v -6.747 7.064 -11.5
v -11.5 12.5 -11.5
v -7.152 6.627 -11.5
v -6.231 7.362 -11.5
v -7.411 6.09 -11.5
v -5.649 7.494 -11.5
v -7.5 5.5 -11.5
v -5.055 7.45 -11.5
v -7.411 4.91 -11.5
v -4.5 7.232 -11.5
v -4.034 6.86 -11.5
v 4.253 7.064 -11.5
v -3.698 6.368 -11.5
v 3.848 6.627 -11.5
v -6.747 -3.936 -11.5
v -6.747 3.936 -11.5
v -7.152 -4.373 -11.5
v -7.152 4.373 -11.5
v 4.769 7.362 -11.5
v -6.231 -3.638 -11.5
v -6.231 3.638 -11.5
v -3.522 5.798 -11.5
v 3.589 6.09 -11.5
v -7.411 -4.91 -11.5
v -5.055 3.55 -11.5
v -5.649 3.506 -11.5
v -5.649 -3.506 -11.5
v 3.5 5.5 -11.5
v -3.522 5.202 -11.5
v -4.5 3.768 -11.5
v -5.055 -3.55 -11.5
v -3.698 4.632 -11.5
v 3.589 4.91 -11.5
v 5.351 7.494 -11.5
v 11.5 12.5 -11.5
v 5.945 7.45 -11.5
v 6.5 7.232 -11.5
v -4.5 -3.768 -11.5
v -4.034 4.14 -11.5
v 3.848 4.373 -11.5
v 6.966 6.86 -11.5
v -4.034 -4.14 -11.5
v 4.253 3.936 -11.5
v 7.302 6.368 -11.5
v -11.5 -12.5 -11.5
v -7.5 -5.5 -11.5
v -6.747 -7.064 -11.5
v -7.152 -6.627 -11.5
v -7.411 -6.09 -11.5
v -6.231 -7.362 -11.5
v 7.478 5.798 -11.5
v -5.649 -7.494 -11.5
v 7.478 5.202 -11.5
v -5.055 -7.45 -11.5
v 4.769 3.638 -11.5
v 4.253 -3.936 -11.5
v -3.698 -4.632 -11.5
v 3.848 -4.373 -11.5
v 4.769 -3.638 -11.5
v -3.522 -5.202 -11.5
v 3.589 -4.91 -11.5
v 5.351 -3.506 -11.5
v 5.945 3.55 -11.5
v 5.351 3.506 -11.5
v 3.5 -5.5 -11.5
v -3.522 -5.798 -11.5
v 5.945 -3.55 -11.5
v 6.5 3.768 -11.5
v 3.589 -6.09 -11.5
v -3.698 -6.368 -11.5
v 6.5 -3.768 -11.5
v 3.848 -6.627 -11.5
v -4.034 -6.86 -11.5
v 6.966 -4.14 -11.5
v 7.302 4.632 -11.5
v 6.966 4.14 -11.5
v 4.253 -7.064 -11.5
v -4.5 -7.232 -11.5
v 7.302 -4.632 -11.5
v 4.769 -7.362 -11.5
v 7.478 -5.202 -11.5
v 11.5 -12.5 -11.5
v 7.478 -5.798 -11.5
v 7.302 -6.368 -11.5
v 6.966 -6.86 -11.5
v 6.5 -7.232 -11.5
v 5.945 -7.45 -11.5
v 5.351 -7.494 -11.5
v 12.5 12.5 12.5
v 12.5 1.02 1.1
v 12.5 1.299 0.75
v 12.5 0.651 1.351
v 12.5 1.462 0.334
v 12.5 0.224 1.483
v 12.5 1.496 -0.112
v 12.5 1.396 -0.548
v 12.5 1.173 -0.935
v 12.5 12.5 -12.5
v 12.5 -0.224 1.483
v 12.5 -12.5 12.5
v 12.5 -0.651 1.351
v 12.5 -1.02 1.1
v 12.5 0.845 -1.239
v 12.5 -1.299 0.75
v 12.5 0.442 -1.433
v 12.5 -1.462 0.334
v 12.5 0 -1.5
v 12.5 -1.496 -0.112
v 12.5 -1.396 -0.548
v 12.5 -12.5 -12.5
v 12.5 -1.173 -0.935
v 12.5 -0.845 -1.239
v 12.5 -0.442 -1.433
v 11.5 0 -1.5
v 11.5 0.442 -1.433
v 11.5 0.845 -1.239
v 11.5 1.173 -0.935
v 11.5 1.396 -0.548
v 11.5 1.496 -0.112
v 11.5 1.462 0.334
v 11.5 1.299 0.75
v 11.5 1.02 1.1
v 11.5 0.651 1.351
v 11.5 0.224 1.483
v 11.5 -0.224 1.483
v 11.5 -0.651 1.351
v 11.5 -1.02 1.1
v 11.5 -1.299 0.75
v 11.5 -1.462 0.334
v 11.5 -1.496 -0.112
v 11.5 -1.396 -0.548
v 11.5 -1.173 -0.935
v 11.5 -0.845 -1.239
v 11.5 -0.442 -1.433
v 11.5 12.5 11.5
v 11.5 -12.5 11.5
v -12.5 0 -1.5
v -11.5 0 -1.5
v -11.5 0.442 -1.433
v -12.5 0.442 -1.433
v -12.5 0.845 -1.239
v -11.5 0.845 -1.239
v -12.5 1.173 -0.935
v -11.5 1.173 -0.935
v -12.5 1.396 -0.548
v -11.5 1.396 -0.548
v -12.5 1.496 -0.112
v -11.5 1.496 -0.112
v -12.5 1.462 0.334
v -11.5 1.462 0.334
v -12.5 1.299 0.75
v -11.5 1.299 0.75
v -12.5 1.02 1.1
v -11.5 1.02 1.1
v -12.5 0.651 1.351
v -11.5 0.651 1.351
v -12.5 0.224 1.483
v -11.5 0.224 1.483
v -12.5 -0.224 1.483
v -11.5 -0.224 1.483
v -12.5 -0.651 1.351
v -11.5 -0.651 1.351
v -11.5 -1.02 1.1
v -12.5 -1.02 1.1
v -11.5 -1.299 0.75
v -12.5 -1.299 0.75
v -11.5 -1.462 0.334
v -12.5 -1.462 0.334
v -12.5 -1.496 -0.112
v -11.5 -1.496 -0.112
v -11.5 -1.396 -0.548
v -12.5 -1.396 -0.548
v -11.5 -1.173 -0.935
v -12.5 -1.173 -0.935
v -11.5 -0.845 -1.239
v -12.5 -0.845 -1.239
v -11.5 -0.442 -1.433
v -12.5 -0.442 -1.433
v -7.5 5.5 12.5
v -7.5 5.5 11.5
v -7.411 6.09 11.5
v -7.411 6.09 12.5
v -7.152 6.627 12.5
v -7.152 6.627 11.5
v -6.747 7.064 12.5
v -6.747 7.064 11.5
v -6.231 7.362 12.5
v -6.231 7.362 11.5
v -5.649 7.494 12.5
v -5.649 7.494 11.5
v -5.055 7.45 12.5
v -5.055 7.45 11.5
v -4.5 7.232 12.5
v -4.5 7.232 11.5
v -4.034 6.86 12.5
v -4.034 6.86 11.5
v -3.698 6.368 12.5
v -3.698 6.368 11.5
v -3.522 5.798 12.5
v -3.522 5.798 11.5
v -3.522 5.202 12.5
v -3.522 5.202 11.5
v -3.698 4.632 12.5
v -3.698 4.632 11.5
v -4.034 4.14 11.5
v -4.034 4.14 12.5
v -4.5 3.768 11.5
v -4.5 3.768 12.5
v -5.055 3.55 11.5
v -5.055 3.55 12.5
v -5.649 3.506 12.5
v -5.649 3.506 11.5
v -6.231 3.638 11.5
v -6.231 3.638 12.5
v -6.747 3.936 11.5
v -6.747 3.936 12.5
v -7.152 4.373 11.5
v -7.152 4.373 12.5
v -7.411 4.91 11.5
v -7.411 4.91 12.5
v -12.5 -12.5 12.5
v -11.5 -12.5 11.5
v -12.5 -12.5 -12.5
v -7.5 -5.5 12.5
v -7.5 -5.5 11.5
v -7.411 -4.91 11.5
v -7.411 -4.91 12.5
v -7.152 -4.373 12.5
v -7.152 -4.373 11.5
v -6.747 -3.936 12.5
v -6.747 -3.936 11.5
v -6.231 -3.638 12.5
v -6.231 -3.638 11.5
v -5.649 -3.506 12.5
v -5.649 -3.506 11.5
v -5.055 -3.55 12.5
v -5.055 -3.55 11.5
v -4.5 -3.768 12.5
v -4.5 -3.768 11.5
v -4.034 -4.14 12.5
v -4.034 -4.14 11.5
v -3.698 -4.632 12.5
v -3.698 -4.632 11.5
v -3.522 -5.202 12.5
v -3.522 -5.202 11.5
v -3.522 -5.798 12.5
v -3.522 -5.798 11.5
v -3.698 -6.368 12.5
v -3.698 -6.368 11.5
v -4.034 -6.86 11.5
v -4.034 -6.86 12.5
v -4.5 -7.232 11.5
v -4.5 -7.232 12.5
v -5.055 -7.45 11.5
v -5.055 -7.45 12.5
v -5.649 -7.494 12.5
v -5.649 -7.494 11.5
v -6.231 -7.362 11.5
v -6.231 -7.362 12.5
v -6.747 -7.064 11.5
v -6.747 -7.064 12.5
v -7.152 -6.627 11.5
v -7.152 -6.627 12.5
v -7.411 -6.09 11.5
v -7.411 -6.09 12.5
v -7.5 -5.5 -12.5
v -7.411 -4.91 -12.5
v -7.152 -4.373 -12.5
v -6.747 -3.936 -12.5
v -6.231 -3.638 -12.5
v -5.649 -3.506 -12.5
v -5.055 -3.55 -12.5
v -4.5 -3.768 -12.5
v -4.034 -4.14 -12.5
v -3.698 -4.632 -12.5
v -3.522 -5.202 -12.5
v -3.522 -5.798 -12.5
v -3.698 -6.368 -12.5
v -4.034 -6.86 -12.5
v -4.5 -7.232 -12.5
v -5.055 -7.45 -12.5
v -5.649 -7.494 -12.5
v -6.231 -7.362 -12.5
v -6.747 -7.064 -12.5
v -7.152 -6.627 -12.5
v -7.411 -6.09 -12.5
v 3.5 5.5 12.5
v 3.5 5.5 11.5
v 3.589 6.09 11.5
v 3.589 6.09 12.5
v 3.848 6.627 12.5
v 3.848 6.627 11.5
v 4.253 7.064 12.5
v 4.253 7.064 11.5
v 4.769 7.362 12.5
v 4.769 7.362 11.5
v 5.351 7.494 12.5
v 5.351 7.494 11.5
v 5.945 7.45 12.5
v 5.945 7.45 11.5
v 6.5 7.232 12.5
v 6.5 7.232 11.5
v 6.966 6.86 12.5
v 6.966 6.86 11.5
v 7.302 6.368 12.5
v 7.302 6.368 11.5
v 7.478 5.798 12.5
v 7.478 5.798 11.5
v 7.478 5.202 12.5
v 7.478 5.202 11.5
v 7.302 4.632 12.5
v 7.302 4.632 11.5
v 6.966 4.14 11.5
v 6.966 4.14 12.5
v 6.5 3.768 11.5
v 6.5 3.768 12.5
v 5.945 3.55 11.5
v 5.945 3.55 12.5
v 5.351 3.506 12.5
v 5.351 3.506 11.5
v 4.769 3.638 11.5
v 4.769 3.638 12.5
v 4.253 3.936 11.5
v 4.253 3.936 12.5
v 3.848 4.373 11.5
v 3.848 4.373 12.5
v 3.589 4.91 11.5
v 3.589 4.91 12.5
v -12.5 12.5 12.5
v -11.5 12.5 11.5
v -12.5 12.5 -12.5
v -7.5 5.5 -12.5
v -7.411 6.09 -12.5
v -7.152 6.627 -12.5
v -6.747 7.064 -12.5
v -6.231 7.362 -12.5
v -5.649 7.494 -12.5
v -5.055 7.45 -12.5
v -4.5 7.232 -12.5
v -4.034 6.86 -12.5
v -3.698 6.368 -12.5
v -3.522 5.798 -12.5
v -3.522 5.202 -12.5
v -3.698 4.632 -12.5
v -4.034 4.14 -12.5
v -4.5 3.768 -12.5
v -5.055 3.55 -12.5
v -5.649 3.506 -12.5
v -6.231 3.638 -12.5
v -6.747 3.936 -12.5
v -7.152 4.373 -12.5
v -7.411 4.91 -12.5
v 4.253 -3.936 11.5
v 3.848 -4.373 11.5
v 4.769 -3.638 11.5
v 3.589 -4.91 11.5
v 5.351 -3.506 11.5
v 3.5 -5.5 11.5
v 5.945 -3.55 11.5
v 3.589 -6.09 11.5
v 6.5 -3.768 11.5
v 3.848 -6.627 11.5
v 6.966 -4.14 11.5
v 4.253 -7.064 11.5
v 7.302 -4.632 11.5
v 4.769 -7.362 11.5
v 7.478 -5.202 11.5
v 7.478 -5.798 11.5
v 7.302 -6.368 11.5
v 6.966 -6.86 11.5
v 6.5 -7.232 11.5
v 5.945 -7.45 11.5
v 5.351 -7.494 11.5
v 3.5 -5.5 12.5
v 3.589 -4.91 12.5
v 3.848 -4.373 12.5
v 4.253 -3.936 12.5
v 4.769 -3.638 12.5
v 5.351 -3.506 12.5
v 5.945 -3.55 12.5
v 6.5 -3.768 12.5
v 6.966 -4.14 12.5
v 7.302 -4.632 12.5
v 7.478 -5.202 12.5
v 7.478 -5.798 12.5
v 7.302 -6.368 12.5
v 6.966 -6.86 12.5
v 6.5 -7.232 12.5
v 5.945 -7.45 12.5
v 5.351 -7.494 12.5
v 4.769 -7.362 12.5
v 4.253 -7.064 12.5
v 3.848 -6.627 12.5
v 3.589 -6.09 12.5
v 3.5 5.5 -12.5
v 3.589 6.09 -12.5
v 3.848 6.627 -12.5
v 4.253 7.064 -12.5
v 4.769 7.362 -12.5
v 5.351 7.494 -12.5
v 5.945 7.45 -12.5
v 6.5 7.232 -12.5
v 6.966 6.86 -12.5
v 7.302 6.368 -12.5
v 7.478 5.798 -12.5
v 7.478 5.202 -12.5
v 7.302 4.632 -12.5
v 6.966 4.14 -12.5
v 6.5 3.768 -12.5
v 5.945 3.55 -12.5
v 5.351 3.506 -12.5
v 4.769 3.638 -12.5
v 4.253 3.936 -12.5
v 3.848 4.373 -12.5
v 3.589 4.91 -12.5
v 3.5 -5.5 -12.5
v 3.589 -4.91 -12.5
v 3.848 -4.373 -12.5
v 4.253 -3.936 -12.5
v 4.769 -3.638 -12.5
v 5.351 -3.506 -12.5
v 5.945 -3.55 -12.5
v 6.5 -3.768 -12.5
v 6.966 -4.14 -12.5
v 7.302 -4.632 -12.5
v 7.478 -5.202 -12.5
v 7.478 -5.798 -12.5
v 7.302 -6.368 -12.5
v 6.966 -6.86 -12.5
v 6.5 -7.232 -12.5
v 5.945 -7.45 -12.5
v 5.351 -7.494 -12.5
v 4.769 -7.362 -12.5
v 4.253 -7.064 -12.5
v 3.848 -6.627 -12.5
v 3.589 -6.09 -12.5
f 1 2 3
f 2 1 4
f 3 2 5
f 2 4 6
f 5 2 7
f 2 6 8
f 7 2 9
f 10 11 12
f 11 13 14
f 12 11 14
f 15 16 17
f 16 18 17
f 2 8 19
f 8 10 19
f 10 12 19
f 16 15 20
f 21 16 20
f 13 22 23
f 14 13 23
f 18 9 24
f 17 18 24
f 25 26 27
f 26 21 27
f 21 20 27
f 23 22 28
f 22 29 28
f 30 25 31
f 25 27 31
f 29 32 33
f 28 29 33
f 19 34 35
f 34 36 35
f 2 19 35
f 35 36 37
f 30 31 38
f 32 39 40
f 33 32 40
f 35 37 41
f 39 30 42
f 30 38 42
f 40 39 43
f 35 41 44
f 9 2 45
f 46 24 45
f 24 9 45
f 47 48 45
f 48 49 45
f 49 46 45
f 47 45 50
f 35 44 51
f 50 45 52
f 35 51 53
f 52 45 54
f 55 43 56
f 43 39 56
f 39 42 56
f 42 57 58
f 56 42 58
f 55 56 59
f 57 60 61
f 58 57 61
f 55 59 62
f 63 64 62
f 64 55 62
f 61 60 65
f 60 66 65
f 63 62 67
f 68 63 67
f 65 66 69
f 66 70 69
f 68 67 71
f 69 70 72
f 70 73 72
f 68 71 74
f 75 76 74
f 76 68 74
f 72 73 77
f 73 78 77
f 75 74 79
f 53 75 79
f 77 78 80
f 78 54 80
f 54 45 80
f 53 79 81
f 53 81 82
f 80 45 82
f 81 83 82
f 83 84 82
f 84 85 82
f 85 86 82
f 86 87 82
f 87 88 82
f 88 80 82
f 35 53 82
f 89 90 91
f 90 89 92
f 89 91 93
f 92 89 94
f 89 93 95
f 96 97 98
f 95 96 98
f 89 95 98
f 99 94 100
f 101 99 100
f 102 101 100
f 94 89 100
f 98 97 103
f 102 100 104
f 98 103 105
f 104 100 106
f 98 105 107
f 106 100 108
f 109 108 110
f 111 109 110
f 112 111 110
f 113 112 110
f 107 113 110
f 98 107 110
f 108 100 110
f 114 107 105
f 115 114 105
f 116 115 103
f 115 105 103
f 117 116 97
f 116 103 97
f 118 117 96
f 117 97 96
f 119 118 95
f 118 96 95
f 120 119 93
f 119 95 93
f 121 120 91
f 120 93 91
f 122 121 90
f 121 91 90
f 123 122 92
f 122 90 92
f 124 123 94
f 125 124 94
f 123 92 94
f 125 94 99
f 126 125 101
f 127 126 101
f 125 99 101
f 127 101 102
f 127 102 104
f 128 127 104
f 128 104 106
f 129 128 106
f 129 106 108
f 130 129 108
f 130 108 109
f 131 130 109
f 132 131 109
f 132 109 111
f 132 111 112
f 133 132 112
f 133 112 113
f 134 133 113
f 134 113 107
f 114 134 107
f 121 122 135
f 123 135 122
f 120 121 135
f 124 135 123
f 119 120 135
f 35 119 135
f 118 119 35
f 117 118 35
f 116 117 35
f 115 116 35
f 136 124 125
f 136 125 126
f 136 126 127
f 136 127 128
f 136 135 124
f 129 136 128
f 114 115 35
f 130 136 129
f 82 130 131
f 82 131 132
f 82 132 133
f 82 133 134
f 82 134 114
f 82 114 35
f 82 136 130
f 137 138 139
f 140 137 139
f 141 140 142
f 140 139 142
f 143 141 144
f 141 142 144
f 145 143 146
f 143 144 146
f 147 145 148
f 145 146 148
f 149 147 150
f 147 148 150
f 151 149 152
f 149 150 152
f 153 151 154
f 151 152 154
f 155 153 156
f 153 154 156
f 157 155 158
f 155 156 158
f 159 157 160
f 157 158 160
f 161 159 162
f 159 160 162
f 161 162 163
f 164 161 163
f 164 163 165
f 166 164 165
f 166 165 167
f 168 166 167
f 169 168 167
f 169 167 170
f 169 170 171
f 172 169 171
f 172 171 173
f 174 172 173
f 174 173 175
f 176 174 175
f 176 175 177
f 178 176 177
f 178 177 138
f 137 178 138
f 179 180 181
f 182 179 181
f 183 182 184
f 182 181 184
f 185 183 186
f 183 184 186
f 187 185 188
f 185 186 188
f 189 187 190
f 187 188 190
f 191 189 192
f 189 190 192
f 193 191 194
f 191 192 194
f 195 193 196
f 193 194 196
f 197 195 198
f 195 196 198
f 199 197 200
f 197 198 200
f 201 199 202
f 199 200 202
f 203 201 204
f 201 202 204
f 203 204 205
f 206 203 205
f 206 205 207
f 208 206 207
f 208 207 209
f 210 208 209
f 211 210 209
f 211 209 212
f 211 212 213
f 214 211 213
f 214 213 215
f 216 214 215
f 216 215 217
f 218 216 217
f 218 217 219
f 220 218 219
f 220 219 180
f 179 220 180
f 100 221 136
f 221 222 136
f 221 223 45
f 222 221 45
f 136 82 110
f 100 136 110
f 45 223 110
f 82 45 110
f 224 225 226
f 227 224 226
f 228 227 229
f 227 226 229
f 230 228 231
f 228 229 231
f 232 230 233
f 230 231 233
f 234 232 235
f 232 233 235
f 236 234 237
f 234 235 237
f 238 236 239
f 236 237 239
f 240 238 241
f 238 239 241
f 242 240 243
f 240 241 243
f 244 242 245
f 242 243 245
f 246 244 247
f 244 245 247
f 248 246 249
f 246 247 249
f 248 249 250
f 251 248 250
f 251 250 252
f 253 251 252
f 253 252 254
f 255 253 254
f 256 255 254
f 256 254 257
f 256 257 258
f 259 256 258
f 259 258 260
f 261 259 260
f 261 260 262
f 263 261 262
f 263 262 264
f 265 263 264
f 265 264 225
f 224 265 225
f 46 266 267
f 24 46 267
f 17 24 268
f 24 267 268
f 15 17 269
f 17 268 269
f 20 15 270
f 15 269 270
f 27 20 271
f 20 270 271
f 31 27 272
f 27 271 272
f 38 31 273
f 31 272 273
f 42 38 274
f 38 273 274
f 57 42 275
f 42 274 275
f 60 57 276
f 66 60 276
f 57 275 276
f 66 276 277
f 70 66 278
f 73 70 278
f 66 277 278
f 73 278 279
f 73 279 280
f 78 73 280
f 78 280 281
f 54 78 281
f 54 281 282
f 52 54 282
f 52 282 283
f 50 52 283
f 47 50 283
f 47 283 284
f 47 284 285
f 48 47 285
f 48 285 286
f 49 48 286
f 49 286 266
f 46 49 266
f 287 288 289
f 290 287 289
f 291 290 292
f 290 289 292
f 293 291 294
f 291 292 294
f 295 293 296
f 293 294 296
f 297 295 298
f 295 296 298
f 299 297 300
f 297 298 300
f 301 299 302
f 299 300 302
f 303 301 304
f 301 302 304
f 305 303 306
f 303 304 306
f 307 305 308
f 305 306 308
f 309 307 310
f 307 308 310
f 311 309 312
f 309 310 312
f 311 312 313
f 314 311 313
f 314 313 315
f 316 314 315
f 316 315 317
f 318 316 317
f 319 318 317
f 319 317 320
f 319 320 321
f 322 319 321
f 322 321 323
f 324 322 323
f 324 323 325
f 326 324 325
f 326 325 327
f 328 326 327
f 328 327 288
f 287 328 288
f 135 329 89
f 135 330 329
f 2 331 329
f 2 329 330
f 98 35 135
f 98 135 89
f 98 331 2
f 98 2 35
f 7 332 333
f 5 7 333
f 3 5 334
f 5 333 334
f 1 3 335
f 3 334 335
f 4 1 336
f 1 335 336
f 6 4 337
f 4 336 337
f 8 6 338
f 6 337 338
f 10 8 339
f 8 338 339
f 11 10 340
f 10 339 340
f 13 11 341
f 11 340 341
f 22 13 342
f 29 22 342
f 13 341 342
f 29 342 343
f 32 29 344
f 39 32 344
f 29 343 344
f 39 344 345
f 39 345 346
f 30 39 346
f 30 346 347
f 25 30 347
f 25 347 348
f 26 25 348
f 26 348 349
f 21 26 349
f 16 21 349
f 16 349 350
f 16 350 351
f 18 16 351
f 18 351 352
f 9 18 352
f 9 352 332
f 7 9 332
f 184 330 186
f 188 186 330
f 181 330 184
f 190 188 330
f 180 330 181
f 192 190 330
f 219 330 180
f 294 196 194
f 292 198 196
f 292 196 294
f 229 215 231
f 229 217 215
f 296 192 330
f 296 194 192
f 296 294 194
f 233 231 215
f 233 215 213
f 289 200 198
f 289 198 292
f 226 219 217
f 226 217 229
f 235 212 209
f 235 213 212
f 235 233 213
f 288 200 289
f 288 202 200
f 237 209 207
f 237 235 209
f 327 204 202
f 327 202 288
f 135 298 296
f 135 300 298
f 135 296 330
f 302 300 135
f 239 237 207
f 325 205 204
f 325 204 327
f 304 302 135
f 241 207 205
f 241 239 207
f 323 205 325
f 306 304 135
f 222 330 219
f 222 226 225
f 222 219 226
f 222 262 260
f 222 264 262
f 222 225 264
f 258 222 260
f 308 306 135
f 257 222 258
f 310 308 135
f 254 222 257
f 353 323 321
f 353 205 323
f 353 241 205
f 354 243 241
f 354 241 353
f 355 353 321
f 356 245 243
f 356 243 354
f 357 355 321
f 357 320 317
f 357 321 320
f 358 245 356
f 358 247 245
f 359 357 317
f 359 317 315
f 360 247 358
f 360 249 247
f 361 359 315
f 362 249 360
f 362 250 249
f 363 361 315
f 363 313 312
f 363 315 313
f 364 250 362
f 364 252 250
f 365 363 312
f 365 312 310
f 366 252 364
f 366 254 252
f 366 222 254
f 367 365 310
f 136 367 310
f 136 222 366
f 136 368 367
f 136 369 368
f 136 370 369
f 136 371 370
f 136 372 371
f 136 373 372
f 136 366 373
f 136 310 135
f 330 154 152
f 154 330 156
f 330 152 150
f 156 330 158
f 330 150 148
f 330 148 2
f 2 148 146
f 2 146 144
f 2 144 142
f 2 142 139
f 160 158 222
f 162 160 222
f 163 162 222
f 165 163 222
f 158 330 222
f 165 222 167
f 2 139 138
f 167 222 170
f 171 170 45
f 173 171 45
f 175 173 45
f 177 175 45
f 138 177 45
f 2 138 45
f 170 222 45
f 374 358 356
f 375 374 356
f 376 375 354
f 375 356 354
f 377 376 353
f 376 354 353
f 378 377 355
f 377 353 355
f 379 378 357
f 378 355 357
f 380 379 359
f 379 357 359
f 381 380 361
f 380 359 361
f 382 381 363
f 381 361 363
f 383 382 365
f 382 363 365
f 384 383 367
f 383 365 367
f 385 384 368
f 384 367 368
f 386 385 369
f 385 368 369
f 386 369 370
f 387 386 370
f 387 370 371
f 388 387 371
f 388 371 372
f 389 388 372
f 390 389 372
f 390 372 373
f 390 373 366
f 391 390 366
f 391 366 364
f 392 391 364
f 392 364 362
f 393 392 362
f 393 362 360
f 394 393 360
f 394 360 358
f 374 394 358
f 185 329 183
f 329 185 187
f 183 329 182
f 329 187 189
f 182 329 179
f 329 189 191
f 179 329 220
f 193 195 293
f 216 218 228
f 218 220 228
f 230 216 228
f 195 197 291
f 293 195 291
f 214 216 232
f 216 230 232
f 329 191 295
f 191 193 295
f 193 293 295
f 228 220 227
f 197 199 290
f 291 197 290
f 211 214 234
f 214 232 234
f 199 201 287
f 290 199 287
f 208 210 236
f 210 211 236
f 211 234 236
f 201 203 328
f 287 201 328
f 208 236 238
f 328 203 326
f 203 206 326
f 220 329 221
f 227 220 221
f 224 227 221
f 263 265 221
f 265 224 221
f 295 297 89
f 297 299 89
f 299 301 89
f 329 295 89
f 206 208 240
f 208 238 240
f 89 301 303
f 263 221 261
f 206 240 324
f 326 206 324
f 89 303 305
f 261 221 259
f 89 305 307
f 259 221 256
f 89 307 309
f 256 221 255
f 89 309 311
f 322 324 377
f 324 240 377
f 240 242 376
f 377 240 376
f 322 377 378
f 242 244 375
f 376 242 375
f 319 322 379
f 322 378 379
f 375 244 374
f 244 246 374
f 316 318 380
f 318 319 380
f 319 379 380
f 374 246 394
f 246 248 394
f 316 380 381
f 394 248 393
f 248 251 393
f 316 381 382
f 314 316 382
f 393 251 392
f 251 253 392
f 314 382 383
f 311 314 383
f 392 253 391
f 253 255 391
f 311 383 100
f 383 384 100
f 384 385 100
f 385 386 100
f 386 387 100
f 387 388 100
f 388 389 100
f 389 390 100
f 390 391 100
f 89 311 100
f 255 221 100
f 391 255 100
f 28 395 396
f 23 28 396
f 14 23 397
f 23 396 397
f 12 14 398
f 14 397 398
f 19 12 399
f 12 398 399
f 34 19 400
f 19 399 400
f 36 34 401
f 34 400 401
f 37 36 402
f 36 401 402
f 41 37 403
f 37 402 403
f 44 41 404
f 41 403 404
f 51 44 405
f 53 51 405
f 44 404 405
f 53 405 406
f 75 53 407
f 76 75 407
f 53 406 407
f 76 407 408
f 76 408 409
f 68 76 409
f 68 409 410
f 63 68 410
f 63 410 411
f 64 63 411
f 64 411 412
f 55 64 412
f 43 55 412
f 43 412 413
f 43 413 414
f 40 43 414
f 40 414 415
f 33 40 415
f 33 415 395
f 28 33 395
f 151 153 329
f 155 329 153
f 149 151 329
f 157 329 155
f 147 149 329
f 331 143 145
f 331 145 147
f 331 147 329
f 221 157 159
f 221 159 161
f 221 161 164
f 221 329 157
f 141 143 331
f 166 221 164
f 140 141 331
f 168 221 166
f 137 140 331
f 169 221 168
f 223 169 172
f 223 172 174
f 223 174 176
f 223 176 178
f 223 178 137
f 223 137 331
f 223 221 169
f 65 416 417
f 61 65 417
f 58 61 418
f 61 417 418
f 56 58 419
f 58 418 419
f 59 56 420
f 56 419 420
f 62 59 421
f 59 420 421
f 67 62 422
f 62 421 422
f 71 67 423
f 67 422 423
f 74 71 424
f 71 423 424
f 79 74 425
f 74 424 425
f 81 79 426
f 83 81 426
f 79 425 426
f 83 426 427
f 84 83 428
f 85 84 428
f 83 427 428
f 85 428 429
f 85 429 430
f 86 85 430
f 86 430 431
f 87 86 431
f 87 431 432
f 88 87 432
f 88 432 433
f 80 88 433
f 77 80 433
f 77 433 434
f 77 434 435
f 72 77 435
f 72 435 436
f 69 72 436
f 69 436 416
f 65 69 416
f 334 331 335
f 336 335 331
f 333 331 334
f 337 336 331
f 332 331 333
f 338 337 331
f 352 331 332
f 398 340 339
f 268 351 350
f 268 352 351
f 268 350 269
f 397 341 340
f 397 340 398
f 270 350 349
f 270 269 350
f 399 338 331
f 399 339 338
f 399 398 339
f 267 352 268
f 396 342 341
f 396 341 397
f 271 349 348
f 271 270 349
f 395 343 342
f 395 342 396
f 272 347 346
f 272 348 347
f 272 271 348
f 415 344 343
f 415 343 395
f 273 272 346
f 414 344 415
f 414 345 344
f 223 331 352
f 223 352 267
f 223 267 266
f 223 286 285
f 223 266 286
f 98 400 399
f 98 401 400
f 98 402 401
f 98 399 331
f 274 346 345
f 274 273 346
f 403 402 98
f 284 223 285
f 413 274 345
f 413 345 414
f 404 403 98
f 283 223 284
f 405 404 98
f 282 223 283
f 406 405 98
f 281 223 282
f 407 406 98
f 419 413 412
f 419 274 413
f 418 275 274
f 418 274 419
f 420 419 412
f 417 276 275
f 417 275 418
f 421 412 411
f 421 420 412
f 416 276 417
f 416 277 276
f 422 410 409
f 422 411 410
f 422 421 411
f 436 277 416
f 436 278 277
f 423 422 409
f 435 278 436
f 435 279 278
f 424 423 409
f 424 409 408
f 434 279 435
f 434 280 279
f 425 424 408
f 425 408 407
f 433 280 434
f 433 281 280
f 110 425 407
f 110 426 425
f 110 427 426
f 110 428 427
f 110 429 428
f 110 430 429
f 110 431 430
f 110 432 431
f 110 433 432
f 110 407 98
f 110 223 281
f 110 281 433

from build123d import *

# Parameters (mm, degrees)
BOSS_EXTRUDE1_DEPTH      = 12.5
BOSS_EXTRUDE1_DEPTH_BACK = 12.5
SKETCH1_W                = 25
SKETCH1_H                = 25
SKETCH1_W_2              = 23
SKETCH1_H_2              = 23
SKETCH2_R                = 2
CUT_EXTRUDE1_DEPTH       = 25
SKETCH3_R                = 1.5
CUT_EXTRUDE2_DEPTH       = 25


with BuildPart() as part:
    # Sketch1 → Boss-Extrude1 (new, two sides: drawn at the far end of the back side and taken through both)
    with BuildSketch(Plane(origin=(0, 0, 0), x_dir=(1, 0, 0), z_dir=(0, 1, 0)).offset(-BOSS_EXTRUDE1_DEPTH_BACK)):
        Rectangle(SKETCH1_W, SKETCH1_H)
        Rectangle(SKETCH1_W_2, SKETCH1_H_2, mode=Mode.SUBTRACT)
    extrude(amount=BOSS_EXTRUDE1_DEPTH + BOSS_EXTRUDE1_DEPTH_BACK)

    # Sketch2 → Cut-Extrude1 (cut)
    with BuildSketch(Plane(origin=(0, 0, -12.5), x_dir=(-1, 0, 0), z_dir=(0, 0, -1))):
        with Locations((5.5, 5.5)):
            Circle(SKETCH2_R)
        with Locations((5.5, -5.5)):
            Circle(SKETCH2_R)
        with Locations((-5.5, -5.5)):
            Circle(SKETCH2_R)
        with Locations((-5.5, 5.5)):
            Circle(SKETCH2_R)
    extrude(amount=-CUT_EXTRUDE1_DEPTH, mode=Mode.SUBTRACT)

    # Sketch3 → Cut-Extrude2 (cut)
    with BuildSketch(Plane(origin=(12.5, 0, 0), x_dir=(0, 0, -1), z_dir=(1, 0, 0))):
        Circle(SKETCH3_R)
    extrude(amount=-CUT_EXTRUDE2_DEPTH, mode=Mode.SUBTRACT)


solid = part.part
